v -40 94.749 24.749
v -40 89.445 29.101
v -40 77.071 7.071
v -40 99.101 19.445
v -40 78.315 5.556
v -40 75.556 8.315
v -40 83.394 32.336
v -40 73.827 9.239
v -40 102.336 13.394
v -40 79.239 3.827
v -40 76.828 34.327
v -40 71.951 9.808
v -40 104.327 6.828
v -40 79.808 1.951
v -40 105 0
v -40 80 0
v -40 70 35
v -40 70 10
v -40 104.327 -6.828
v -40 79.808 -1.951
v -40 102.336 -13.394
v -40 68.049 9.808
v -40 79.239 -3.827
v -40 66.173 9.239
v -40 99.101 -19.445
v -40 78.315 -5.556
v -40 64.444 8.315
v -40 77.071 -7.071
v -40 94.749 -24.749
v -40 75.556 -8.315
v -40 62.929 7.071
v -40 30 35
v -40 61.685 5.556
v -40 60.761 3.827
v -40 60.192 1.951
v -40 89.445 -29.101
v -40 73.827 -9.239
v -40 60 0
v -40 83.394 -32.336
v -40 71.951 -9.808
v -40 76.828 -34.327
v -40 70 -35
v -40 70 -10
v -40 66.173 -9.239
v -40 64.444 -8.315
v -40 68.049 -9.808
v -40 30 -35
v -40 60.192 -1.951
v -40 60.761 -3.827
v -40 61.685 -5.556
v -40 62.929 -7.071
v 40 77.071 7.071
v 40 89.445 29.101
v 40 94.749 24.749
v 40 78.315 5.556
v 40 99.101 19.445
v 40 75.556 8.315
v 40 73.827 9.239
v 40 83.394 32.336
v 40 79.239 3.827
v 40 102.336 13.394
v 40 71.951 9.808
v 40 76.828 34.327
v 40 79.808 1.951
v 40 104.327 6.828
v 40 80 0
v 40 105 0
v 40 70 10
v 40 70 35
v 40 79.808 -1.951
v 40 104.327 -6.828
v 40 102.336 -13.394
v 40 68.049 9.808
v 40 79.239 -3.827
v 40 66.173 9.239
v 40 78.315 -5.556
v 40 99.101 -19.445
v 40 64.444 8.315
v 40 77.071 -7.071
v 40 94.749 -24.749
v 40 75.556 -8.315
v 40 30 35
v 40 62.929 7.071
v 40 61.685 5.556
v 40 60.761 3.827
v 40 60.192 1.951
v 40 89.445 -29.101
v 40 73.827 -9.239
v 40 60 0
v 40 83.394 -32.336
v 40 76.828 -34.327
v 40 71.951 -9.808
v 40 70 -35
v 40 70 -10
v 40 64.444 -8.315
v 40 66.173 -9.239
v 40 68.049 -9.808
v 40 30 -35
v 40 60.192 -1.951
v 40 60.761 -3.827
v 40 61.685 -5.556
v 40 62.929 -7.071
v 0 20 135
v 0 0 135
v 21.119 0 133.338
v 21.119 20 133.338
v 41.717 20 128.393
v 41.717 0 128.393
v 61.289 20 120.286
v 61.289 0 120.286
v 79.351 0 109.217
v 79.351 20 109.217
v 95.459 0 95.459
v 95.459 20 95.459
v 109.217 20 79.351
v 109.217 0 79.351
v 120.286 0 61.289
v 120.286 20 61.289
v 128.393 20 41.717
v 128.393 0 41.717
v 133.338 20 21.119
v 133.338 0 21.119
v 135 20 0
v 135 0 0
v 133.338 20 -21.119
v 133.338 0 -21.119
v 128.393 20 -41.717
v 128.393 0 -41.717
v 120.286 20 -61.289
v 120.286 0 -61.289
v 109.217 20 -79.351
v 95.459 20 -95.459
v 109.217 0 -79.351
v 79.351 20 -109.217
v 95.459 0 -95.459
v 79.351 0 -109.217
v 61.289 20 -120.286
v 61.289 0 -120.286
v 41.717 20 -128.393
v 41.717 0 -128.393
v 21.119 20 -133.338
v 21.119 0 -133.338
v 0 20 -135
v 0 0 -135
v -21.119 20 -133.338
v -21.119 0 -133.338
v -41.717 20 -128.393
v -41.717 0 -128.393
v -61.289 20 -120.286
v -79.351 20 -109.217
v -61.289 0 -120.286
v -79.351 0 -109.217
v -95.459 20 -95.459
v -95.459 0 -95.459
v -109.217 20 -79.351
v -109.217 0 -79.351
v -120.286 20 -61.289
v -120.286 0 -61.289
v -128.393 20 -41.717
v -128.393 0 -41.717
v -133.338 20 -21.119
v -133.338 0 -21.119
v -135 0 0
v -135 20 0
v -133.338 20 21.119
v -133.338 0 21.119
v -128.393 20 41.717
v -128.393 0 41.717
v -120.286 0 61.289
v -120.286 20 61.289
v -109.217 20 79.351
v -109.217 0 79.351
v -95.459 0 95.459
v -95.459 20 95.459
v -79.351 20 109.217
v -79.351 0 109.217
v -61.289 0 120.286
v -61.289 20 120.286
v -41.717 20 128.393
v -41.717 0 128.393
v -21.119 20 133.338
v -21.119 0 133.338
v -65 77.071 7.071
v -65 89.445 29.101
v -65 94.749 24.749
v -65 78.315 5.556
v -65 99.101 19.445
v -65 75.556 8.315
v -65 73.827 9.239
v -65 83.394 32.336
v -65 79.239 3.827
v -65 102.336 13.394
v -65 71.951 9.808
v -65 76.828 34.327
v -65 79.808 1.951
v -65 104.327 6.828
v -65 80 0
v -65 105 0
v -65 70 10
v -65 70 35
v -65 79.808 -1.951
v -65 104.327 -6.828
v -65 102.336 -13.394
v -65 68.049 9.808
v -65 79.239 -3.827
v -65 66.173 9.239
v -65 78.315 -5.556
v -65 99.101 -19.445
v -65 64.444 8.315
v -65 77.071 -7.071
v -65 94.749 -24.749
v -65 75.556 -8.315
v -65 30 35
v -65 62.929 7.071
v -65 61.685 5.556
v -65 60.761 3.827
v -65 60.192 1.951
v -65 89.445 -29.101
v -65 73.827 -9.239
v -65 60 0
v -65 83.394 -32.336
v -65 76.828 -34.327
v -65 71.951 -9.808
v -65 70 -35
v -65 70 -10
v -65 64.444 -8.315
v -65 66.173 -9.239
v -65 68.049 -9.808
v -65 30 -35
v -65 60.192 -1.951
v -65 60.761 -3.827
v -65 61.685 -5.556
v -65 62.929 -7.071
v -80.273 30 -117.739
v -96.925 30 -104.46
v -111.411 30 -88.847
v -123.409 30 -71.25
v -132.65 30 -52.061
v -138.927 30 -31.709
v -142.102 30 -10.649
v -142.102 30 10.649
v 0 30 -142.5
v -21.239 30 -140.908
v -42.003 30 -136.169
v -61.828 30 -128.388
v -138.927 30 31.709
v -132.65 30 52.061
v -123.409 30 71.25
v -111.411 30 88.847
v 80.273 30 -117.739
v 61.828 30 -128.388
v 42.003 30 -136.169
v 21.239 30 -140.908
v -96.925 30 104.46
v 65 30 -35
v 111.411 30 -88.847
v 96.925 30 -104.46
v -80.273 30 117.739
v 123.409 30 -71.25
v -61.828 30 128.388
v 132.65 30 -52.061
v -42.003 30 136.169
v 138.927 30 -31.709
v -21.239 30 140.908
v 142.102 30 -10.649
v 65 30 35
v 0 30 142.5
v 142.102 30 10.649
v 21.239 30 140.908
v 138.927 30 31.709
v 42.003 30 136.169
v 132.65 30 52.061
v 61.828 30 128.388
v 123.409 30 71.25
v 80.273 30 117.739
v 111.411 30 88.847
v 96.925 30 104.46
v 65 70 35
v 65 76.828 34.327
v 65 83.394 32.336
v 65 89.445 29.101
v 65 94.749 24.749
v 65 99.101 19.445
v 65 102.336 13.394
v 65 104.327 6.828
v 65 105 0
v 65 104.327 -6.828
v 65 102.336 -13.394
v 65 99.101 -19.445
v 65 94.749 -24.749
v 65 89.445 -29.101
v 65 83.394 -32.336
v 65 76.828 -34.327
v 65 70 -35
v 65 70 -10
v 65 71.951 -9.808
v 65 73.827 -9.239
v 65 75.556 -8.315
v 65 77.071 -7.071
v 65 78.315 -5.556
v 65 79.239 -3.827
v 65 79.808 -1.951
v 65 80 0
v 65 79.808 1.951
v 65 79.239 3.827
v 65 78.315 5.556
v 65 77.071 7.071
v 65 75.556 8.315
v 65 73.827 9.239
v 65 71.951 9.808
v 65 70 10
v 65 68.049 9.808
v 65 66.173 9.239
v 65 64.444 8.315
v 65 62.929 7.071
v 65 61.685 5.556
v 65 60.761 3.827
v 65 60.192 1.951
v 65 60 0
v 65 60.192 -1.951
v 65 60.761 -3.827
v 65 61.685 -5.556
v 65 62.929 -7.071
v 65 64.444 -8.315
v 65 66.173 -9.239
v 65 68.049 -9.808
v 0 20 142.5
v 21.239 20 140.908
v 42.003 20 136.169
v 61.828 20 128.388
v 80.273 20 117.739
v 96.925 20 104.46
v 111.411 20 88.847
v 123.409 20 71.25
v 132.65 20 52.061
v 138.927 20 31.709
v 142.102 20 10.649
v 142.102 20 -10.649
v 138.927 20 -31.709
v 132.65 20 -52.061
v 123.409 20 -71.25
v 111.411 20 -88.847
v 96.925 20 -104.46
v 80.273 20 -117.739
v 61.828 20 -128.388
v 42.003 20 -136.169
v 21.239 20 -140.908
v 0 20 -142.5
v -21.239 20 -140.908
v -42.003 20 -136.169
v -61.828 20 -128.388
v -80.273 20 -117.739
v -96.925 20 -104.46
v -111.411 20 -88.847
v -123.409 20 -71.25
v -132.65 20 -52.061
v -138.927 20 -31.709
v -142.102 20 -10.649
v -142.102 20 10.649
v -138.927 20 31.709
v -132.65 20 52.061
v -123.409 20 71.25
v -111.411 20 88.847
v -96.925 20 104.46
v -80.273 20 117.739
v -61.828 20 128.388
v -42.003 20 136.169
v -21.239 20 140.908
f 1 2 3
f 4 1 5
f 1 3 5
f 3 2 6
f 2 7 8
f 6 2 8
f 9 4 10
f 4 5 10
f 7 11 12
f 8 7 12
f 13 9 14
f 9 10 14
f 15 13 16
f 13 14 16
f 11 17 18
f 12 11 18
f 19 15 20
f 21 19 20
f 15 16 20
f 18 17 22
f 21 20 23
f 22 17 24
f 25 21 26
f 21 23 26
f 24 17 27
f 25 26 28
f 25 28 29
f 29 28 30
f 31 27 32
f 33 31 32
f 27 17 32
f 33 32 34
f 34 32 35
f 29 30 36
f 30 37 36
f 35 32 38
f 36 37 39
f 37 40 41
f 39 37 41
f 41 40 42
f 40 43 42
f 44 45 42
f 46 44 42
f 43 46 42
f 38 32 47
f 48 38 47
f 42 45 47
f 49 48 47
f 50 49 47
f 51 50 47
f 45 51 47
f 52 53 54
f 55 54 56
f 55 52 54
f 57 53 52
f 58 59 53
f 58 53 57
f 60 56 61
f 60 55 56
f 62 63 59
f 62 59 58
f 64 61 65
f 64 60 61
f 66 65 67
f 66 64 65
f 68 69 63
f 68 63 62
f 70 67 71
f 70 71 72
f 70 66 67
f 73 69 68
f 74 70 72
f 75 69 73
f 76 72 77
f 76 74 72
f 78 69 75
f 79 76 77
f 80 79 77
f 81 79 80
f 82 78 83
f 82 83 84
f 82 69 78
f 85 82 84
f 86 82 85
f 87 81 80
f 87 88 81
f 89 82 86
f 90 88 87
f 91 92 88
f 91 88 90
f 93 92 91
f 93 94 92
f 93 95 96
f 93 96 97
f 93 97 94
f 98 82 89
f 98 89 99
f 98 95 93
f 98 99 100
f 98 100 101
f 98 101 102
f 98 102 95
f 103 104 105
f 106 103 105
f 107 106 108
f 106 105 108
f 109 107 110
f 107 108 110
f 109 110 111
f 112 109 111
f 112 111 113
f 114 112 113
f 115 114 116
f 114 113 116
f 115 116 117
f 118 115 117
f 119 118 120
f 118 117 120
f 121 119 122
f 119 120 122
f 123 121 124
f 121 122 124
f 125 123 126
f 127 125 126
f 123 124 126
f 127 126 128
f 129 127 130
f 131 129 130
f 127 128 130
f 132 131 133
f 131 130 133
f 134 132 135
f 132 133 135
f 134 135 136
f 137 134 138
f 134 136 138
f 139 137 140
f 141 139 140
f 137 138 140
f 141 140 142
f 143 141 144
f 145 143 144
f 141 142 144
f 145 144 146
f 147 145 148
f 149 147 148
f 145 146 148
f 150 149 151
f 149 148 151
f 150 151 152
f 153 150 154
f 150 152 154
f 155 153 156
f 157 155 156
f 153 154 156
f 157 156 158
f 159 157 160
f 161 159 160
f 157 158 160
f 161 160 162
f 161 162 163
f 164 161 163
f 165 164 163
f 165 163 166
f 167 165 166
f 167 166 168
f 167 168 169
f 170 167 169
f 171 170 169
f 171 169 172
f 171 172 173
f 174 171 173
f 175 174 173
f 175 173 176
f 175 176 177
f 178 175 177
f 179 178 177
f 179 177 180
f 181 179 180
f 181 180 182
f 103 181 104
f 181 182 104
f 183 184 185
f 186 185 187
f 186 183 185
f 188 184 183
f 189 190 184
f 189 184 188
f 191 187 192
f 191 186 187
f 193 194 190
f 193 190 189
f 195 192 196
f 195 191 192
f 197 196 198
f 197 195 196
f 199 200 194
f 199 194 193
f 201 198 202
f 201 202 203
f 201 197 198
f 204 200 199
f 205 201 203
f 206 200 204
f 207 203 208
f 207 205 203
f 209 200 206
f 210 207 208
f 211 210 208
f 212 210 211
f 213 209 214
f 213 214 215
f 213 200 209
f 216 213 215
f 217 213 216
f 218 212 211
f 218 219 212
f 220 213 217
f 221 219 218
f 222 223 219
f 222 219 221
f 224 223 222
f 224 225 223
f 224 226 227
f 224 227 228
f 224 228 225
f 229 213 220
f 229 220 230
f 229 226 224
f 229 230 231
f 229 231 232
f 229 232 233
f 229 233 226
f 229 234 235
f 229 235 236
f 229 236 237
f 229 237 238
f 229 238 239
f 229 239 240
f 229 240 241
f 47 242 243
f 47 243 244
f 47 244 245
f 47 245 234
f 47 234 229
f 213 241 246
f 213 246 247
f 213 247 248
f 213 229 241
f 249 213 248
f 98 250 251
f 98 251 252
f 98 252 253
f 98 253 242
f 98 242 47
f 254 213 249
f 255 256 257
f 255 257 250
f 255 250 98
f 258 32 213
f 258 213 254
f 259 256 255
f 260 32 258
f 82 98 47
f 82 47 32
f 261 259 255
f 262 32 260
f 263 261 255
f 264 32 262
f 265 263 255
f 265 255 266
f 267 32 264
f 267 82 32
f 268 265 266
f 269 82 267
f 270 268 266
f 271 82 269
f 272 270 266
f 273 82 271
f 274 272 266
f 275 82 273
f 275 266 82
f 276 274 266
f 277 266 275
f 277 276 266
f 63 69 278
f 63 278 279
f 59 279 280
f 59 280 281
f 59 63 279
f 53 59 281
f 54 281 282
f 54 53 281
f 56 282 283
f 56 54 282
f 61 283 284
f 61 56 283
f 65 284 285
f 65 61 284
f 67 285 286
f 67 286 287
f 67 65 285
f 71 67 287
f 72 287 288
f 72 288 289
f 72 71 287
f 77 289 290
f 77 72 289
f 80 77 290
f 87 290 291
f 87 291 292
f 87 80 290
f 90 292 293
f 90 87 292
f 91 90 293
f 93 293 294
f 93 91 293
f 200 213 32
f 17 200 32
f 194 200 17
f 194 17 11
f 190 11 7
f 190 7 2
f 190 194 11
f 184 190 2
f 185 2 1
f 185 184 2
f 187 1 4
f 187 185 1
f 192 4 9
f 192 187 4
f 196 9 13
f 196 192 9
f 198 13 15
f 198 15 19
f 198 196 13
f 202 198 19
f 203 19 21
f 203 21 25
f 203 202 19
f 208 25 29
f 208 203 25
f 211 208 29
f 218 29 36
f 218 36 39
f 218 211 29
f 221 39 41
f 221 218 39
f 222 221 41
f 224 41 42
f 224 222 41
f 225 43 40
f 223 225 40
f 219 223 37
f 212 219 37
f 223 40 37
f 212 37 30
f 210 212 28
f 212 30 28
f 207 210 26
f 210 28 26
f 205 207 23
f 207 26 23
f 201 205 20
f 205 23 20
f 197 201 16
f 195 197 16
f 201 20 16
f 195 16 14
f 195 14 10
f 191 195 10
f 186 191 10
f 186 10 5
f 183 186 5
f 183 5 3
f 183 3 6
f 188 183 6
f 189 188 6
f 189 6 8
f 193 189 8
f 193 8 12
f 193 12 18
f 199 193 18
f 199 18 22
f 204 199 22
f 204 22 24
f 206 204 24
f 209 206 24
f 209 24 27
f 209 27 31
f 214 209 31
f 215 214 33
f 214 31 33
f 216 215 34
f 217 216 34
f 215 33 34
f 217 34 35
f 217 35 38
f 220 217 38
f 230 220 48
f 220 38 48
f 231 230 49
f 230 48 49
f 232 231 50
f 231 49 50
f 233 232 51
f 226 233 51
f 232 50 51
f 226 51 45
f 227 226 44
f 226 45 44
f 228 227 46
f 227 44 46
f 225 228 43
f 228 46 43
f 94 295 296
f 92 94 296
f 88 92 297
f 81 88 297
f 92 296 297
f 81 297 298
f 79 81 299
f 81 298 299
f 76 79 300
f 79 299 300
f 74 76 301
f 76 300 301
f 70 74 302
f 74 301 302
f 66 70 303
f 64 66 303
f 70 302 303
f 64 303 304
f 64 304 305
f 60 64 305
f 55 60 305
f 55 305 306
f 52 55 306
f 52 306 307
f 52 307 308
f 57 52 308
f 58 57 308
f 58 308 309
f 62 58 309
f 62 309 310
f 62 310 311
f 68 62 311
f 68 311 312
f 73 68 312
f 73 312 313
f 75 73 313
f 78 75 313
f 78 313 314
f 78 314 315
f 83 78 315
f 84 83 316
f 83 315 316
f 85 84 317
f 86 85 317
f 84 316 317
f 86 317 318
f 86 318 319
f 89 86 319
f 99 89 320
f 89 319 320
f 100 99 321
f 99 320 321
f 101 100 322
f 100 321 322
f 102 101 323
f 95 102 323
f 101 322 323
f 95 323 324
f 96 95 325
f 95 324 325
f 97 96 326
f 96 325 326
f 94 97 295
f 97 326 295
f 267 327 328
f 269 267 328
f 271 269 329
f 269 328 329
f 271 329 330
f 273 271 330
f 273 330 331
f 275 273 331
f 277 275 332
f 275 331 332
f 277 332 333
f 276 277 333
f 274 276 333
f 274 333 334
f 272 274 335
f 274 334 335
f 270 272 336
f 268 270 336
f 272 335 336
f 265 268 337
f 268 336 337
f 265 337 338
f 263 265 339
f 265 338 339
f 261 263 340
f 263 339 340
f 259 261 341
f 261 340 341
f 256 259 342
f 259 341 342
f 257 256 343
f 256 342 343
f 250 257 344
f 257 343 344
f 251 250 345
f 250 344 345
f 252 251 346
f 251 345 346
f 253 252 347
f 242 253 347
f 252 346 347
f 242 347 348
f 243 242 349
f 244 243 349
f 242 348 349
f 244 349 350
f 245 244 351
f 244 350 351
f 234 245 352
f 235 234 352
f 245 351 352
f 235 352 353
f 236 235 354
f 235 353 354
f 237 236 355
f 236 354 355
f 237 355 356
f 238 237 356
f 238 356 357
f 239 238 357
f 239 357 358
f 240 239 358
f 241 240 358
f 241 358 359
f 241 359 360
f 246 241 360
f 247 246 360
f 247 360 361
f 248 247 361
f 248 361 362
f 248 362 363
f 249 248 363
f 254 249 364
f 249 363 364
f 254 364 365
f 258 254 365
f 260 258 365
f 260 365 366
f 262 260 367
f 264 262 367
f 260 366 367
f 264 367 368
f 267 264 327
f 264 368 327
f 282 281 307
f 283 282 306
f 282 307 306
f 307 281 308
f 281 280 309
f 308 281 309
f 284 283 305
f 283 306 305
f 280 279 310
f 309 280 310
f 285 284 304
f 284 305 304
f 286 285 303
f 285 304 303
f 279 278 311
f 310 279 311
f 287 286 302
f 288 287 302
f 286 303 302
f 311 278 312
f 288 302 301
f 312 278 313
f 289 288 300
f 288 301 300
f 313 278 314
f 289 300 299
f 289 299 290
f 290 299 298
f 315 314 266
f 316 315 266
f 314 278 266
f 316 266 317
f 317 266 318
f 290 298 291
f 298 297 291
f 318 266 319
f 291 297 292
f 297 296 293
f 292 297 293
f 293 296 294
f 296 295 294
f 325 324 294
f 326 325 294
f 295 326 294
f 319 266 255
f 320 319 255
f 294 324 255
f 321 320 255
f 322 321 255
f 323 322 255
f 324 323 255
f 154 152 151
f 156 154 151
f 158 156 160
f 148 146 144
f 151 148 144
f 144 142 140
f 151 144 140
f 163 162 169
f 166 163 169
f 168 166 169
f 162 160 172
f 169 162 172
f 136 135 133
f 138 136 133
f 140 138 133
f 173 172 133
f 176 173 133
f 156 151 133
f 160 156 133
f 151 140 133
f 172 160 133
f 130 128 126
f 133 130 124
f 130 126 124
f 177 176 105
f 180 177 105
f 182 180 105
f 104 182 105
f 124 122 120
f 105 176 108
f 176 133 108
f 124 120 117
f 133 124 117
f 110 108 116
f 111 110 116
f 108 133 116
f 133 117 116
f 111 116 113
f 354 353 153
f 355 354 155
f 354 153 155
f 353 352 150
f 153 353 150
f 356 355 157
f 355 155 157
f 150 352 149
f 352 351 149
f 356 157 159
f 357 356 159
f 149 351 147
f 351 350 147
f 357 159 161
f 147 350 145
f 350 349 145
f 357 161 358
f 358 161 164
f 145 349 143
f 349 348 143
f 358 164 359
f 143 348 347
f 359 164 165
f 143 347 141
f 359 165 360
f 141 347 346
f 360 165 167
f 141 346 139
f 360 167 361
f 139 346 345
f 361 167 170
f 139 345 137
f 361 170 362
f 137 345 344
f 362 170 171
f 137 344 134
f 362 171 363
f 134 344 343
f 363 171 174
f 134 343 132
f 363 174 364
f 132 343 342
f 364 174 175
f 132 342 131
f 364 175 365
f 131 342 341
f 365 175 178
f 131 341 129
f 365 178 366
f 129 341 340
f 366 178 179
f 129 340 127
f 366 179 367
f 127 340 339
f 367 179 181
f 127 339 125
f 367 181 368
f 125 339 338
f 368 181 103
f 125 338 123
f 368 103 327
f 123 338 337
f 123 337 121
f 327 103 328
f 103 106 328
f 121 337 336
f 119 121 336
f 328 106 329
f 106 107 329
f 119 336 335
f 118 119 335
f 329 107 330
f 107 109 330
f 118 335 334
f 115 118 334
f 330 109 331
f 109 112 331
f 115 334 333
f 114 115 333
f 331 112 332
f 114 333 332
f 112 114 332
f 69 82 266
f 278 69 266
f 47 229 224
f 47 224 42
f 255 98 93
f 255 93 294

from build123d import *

# Parameters (mm, degrees)
SKETCH1_R           = 135
BOSS_EXTRUDE1_DEPTH = 20
SKETCH3_R           = 142.5
BOSS_EXTRUDE3_DEPTH = 10
SKETCH4_W           = 25
SKETCH4_H           = 70
BOSS_EXTRUDE4_DEPTH = 80
CUT_EXTRUDE1_START  = -130
CUT_EXTRUDE1_DEPTH  = 130
SKETCH6_R           = 10
CUT_EXTRUDE2_DEPTH  = 273.740719365


# Read off the part's stored shape, not the designer's step: Cut-Extrude1
with BuildPart() as part:
    # Sketch1 → Boss-Extrude1 (new body)
    with BuildSketch(Plane(origin=(0, 0, 0), x_dir=(1, 0, 0), z_dir=(0, 1, 0))):
        with Locations(Location((0, 0, 0), (0, 0, 270))):
            Circle(SKETCH1_R)
    extrude(amount=BOSS_EXTRUDE1_DEPTH)

    # Sketch3 → Boss-Extrude3 (add)
    with BuildSketch(Plane(origin=(0, 20, 0), x_dir=(1, 0, 0), z_dir=(0, 1, 0))):
        with Locations(Location((0, 0, 0), (0, 0, 270))):
            Circle(SKETCH3_R)
    extrude(amount=BOSS_EXTRUDE3_DEPTH)

    # Sketch4 → Boss-Extrude4 (add)
    with BuildSketch(Plane(origin=(0, 30, 0), x_dir=(1, 0, 0), z_dir=(0, 1, 0))):
        with Locations((-52.5, 0)):
            Rectangle(SKETCH4_W, SKETCH4_H)
        with Locations((52.5, 0)):
            Rectangle(SKETCH4_W, SKETCH4_H)
    extrude(amount=BOSS_EXTRUDE4_DEPTH)

    # Cut-Extrude1 outline → Cut-Extrude1 (cut)
    with BuildSketch(Plane(origin=(65, 0, 0), x_dir=(0, 0, -1), z_dir=(1, 0, 0)).offset(CUT_EXTRUDE1_START)):
        with BuildLine():
            ThreePointArc((-35, 70), (0, 105), (35, 70))
            Line((35, 70), (35, 110))
            Line((35, 110), (-35, 110))
            Line((-35, 110), (-35, 70))
        make_face()
    extrude(amount=CUT_EXTRUDE1_DEPTH, mode=Mode.SUBTRACT)

    # Sketch6 → Cut-Extrude2 (cut, through all)
    with BuildSketch(Plane(origin=(65, 0, 0), x_dir=(0, 0, -1), z_dir=(1, 0, 0))):
        with Locations((0, 70)):
            Circle(SKETCH6_R)
    extrude(amount=-CUT_EXTRUDE2_DEPTH, mode=Mode.SUBTRACT)


solid = part.part
